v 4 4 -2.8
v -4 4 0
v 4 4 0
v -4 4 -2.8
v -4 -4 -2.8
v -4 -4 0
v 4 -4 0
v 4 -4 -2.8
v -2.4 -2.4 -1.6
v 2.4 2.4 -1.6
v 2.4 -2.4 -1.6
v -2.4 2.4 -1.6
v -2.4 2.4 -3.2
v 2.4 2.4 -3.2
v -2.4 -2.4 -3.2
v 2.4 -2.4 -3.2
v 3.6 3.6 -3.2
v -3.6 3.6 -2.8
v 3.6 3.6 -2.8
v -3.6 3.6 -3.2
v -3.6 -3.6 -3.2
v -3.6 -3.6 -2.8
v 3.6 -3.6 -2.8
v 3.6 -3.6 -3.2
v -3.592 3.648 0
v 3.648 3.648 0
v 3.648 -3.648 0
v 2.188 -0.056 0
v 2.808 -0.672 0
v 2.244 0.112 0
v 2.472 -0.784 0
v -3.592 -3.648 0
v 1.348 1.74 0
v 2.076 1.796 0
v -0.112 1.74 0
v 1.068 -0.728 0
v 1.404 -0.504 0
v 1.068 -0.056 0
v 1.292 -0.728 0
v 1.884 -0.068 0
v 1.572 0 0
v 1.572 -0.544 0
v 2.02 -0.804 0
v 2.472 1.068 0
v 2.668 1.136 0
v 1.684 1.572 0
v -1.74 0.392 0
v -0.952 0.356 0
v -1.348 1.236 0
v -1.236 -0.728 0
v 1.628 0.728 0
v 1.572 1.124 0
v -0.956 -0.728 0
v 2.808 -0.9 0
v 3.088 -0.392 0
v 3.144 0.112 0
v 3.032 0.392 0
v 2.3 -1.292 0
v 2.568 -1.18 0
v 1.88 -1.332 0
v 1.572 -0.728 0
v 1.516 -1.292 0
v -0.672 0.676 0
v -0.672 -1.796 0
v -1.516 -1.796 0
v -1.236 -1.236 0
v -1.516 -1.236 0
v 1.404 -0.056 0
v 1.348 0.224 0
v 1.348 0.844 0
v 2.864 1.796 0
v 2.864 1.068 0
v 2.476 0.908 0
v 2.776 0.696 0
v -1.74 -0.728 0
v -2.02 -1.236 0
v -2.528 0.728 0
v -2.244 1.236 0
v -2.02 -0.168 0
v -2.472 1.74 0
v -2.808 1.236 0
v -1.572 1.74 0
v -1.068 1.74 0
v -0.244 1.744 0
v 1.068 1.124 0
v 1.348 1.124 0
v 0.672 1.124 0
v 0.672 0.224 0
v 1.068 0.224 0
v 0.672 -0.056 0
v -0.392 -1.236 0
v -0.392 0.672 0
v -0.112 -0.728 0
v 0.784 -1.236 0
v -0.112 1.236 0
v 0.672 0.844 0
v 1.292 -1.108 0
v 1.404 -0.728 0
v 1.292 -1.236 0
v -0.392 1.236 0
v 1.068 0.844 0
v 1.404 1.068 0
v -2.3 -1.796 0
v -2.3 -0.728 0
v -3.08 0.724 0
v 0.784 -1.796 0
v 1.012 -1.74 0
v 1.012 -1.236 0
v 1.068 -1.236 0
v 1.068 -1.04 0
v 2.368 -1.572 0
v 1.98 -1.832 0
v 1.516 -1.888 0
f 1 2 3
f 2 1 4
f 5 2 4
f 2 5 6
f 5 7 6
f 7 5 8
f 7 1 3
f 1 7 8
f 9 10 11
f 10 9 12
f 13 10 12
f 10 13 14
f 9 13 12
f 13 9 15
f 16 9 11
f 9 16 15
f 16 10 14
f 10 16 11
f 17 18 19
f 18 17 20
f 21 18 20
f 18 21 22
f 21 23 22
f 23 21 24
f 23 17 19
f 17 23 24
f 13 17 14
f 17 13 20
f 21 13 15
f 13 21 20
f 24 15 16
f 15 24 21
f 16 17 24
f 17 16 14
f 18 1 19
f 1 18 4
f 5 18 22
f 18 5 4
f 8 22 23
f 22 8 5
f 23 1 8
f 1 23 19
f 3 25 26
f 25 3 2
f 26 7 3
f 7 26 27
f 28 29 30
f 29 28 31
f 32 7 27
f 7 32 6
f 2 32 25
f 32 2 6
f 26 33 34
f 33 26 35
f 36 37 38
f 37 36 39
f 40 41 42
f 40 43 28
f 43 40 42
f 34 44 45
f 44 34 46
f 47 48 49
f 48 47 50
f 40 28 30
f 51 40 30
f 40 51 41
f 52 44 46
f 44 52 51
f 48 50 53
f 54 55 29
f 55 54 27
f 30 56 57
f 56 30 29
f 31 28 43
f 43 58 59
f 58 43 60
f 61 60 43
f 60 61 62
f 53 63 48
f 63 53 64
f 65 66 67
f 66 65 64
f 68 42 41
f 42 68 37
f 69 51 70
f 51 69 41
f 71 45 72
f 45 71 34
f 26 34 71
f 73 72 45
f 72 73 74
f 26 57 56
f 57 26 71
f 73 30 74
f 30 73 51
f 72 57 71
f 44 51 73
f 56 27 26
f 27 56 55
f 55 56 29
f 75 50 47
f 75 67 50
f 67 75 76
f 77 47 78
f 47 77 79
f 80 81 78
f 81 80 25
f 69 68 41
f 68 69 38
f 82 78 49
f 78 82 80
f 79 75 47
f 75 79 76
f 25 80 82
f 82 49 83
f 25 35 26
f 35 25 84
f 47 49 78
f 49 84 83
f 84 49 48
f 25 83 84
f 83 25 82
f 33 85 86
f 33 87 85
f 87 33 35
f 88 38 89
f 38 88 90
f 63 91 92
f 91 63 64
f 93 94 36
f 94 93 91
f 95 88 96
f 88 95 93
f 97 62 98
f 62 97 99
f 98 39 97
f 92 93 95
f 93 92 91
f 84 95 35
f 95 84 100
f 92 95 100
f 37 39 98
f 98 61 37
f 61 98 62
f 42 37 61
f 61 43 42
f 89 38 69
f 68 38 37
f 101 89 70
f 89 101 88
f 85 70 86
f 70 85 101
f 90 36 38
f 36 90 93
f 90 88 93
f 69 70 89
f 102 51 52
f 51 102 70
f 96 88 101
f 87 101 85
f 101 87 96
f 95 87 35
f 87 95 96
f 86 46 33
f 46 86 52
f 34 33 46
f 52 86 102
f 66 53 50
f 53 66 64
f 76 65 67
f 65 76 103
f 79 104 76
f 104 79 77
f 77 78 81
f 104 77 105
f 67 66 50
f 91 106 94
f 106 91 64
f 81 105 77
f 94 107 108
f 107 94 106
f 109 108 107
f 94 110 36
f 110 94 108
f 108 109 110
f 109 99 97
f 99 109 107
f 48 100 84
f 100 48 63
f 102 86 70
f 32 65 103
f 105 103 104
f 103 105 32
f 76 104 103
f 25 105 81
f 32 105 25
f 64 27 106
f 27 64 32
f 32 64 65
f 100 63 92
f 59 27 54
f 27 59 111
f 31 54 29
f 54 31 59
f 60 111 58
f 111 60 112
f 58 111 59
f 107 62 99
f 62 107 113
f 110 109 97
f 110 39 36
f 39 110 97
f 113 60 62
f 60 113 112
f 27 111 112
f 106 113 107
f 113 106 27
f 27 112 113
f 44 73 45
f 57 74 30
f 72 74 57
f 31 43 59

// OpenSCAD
// file: ../p/box5.scad
use <../lib.scad>
function ldraw_lib__box5() = [
// 0 Box with 5 Faces and All Edges
// 0 Name: box5.dat
// 0 Author: James Jessiman
// 0 !LDRAW_ORG Primitive UPDATE 2012-01
// 0 !LICENSE Licensed under CC BY 4.0 : see CAreadme.txt
// 
// 0 BFC CERTIFY CCW
  [0,"BFC","CERTIFY"],
  [0,"BFC","CCW"],
// 
// 0 !HISTORY 2002-04-03 [sbliss] Modified for BFC compliance
// 0 !HISTORY 2002-04-25 [PTadmin] Official Update 2002-02
// 0 !HISTORY 2007-06-24 [PTadmin] Header formatted for Contributor Agreement
// 0 !HISTORY 2008-07-01 [PTadmin] Official Update 2008-01
// 0 !HISTORY 2012-02-16 [Philo] Changed to CCW
// 0 !HISTORY 2012-03-30 [PTadmin] Official Update 2012-01
// 
// 
// 2 24 1 1 1 -1 1 1
  [2,24,1,1,1,-1,1,1],
// 2 24 -1 1 1 -1 1 -1
  [2,24,-1,1,1,-1,1,-1],
// 2 24 -1 1 -1 1 1 -1
  [2,24,-1,1,-1,1,1,-1],
// 2 24 1 1 -1 1 1 1
  [2,24,1,1,-1,1,1,1],
// 2 24 1 0 1 -1 0 1
  [2,24,1,0,1,-1,0,1],
// 2 24 -1 0 1 -1 0 -1
  [2,24,-1,0,1,-1,0,-1],
// 2 24 -1 0 -1 1 0 -1
  [2,24,-1,0,-1,1,0,-1],
// 2 24 1 0 -1 1 0 1
  [2,24,1,0,-1,1,0,1],
// 2 24 1 0 1 1 1 1
  [2,24,1,0,1,1,1,1],
// 2 24 -1 0 1 -1 1 1
  [2,24,-1,0,1,-1,1,1],
// 2 24 1 0 -1 1 1 -1
  [2,24,1,0,-1,1,1,-1],
// 2 24 -1 0 -1 -1 1 -1
  [2,24,-1,0,-1,-1,1,-1],
// 4 16 -1 1 1 1 1 1 1 1 -1 -1 1 -1
  [4,16,-1,1,1,1,1,1,1,1,-1,-1,1,-1],
// 4 16 -1 1 1 -1 0 1 1 0 1 1 1 1
  [4,16,-1,1,1,-1,0,1,1,0,1,1,1,1],
// 4 16 -1 1 -1 -1 0 -1 -1 0 1 -1 1 1
  [4,16,-1,1,-1,-1,0,-1,-1,0,1,-1,1,1],
// 4 16 1 1 -1 1 0 -1 -1 0 -1 -1 1 -1
  [4,16,1,1,-1,1,0,-1,-1,0,-1,-1,1,-1],
// 4 16 1 1 1 1 0 1 1 0 -1 1 1 -1
  [4,16,1,1,1,1,0,1,1,0,-1,1,1,-1],
];
module ldraw_lib__box5(step=0, col=false, unit=2/5, alt=false, line=0.2, solid=!$preview)
    makepoly(ldraw_lib__box5(), step=step, col=col, unit=unit, alt=alt, line=line, solid=solid);
ldraw_lib__box5(line=0.2);
// file: ../p/box4.scad
use <../lib.scad>
function ldraw_lib__box4() = [
// 0 Box with 4 Faces (2 Parallel Pairs) and All Edges
// 0 Name: box4.dat
// 0 Author: James Jessiman
// 0 !LDRAW_ORG Primitive UPDATE 2012-01
// 0 !LICENSE Licensed under CC BY 4.0 : see CAreadme.txt
// 
// 0 BFC CERTIFY CCW
  [0,"BFC","CERTIFY"],
  [0,"BFC","CCW"],
// 
// 0 !HISTORY 2002-04-03 [sbliss] Modified for BFC compliance
// 0 !HISTORY 2002-04-25 [PTadmin] Official Update 2002-02
// 0 !HISTORY 2007-06-24 [PTadmin] Header formatted for Contributor Agreement
// 0 !HISTORY 2008-07-01 [PTadmin] Official Update 2008-01
// 0 !HISTORY 2012-02-16 [Philo] Changed to CCW
// 0 !HISTORY 2012-03-30 [PTadmin] Official Update 2012-01
// 
// 
// 2 24 1 1 1 -1 1 1
  [2,24,1,1,1,-1,1,1],
// 2 24 -1 1 1 -1 1 -1
  [2,24,-1,1,1,-1,1,-1],
// 2 24 -1 1 -1 1 1 -1
  [2,24,-1,1,-1,1,1,-1],
// 2 24 1 1 -1 1 1 1
  [2,24,1,1,-1,1,1,1],
// 2 24 1 0 1 -1 0 1
  [2,24,1,0,1,-1,0,1],
// 2 24 -1 0 1 -1 0 -1
  [2,24,-1,0,1,-1,0,-1],
// 2 24 -1 0 -1 1 0 -1
  [2,24,-1,0,-1,1,0,-1],
// 2 24 1 0 -1 1 0 1
  [2,24,1,0,-1,1,0,1],
// 2 24 1 0 1 1 1 1
  [2,24,1,0,1,1,1,1],
// 2 24 -1 0 1 -1 1 1
  [2,24,-1,0,1,-1,1,1],
// 2 24 1 0 -1 1 1 -1
  [2,24,1,0,-1,1,1,-1],
// 2 24 -1 0 -1 -1 1 -1
  [2,24,-1,0,-1,-1,1,-1],
// 4 16 -1 1 1 -1 0 1 1 0 1 1 1 1
  [4,16,-1,1,1,-1,0,1,1,0,1,1,1,1],
// 4 16 -1 1 -1 -1 0 -1 -1 0 1 -1 1 1
  [4,16,-1,1,-1,-1,0,-1,-1,0,1,-1,1,1],
// 4 16 1 1 -1 1 0 -1 -1 0 -1 -1 1 -1
  [4,16,1,1,-1,1,0,-1,-1,0,-1,-1,1,-1],
// 4 16 1 1 1 1 0 1 1 0 -1 1 1 -1
  [4,16,1,1,1,1,0,1,1,0,-1,1,1,-1],
];
module ldraw_lib__box4(step=0, col=false, unit=2/5, alt=false, line=0.2, solid=!$preview)
    makepoly(ldraw_lib__box4(), step=step, col=col, unit=unit, alt=alt, line=line, solid=solid);
ldraw_lib__box4(line=0.2);
// file: s/3070bs01.scad
use <../../lib.scad>
use <../../p/box4.scad>
use <../../p/box5.scad>
function ldraw_lib__s__3070bs01() = [
// 0 ~Tile  1 x  1 with Groove without Top Face
// 0 Name: s\3070bs01.dat
// 0 Author: Chris Dee [cwdee]
// 0 !LDRAW_ORG Subpart UPDATE 2009-02
// 0 !LICENSE Licensed under CC BY 4.0 : see CAreadme.txt
// 
// 0 BFC CERTIFY CCW
  [0,"BFC","CERTIFY"],
  [0,"BFC","CCW"],
// 
// 0 !HISTORY 2009-09-03 [PTadmin] Official Update 2009-02
// 
// 
// 1 16 0 0 0 10 0 0 0 7 0 0 0 10 box4.dat
  [1,16,0,0,0,10,0,0,0,7,0,0,0,10, ldraw_lib__box4()],
// 0 BFC INVERTNEXT
  [0,"BFC","INVERTNEXT"],
// 1 16 0 8 0 6 0 0 0 -4 0 0 0 6 box5.dat
  [1,16,0,8,0,6,0,0,0,-4,0,0,0,6, ldraw_lib__box5()],
// 1 16 0 7 0 9 0 0 0 1 0 0 0 9 box4.dat
  [1,16,0,7,0,9,0,0,0,1,0,0,0,9, ldraw_lib__box4()],
// 
// 4 16 9 8 9 6 8 6 -6 8 6 -9 8 9
  [4,16,9,8,9,6,8,6,-6,8,6,-9,8,9],
// 4 16 -9 8 9 -6 8 6 -6 8 -6 -9 8 -9
  [4,16,-9,8,9,-6,8,6,-6,8,-6,-9,8,-9],
// 4 16 -9 8 -9 -6 8 -6 6 8 -6 9 8 -9
  [4,16,-9,8,-9,-6,8,-6,6,8,-6,9,8,-9],
// 4 16 9 8 -9 6 8 -6 6 8 6 9 8 9
  [4,16,9,8,-9,6,8,-6,6,8,6,9,8,9],
// 
// 4 16 10 7 10 9 7 9 -9 7 9 -10 7 10
  [4,16,10,7,10,9,7,9,-9,7,9,-10,7,10],
// 4 16 -10 7 10 -9 7 9 -9 7 -9 -10 7 -10
  [4,16,-10,7,10,-9,7,9,-9,7,-9,-10,7,-10],
// 4 16 -10 7 -10 -9 7 -9 9 7 -9 10 7 -10
  [4,16,-10,7,-10,-9,7,-9,9,7,-9,10,7,-10],
// 4 16 10 7 -10 9 7 -9 9 7 9 10 7 10
  [4,16,10,7,-10,9,7,-9,9,7,9,10,7,10],
// 0
];
module ldraw_lib__s__3070bs01(step=0, col=false, unit=2/5, alt=false, line=0.2, solid=!$preview)
    makepoly(ldraw_lib__s__3070bs01(), step=step, col=col, unit=unit, alt=alt, line=line, solid=solid);
ldraw_lib__s__3070bs01(line=0.2);
// main file
use <../lib.scad>
use <s/3070bs01.scad>
function ldraw_lib__3070bp0q() = [
// 0 Tile  1 x  1 with Blue, Green, and Yellow Layered "YES" on Bright Pink Background Pattern
// 0 Name: 3070bp0q.dat
// 0 Author: Philippe Hurbain [Philo]
// 0 !LDRAW_ORG Part UPDATE 2020-03
// 0 !LICENSE Licensed under CC BY 4.0 : see CAreadme.txt
// 
// 0 BFC CERTIFY CCW
  [0,"BFC","CERTIFY"],
  [0,"BFC","CCW"],
// 
// 0 !KEYWORDS BrickLink 3070pb150, Dots, Rebrickable 3070bpr0017, Set 41916
// 
// 0 !HISTORY 2020-12-29 [PTadmin] Official Update 2020-03
// 
// 
// 1 16 0 0 0 1 0 0 0 1 0 0 0 1 s\3070bs01.dat
  [1,16,0,0,0,1,0,0,0,1,0,0,0,1, ldraw_lib__s__3070bs01()],
// 4 16 10 0 10 -10 0 10 -8.98 0 9.12 9.12 0 9.12
  [4,16,10,0,10,-10,0,10,-8.98,0,9.12,9.12,0,9.12],
// 4 16 10 0 -10 10 0 10 9.12 0 9.12 9.12 0 -9.12
  [4,16,10,0,-10,10,0,10,9.12,0,9.12,9.12,0,-9.12],
// 4 1 7.02 0 -1.68 5.61 0 0.28 5.47 0 -0.14 6.18 0 -1.96
  [4,1,7.02,0,-1.68,5.61,0,0.28,5.47,0,-0.14,6.18,0,-1.96],
// 4 16 -8.98 0 -9.12 -10 0 -10 10 0 -10 9.12 0 -9.12
  [4,16,-8.98,0,-9.12,-10,0,-10,10,0,-10,9.12,0,-9.12],
// 4 16 -10 0 10 -10 0 -10 -8.98 0 -9.12 -8.98 0 9.12
  [4,16,-10,0,10,-10,0,-10,-8.98,0,-9.12,-8.98,0,9.12],
// 4 29 3.37 0 4.35 5.19 0 4.49 9.12 0 9.12 -0.28 0 4.35
  [4,29,3.37,0,4.35,5.19,0,4.49,9.12,0,9.12,-0.28,0,4.35],
// 4 1 2.67 0 -1.82 3.23 0 -1.82 3.51 0 -1.26 2.67 0 -0.14
  [4,1,2.67,0,-1.82,3.23,0,-1.82,3.51,0,-1.26,2.67,0,-0.14],
// 3 1 4.71 0 -0.17 3.93 0 0 3.93 0 -1.36
  [3,1,4.71,0,-0.17,3.93,0,0,3.93,0,-1.36],
// 4 1 5.05 0 -2.01 5.47 0 -0.14 4.71 0 -0.17 3.93 0 -1.36
  [4,1,5.05,0,-2.01,5.47,0,-0.14,4.71,0,-0.17,3.93,0,-1.36],
// 4 1 6.18 0 2.67 6.67 0 2.84 5.19 0 4.49 4.21 0 3.93
  [4,1,6.18,0,2.67,6.67,0,2.84,5.19,0,4.49,4.21,0,3.93],
// 4 1 -4.35 0 0.98 -3.09 0 -1.82 -2.38 0 0.89 -3.37 0 3.09
  [4,1,-4.35,0,0.98,-3.09,0,-1.82,-2.38,0,0.89,-3.37,0,3.09],
// 3 3 4.71 0 -0.17 5.47 0 -0.14 5.61 0 0.28
  [3,3,4.71,0,-0.17,5.47,0,-0.14,5.61,0,0.28],
// 4 3 4.07 0 1.82 3.93 0 0 4.71 0 -0.17 5.61 0 0.28
  [4,3,4.07,0,1.82,3.93,0,0,4.71,0,-0.17,5.61,0,0.28],
// 4 1 6.18 0 2.67 4.21 0 3.93 3.93 0 2.81 4.07 0 1.82
  [4,1,6.18,0,2.67,4.21,0,3.93,3.93,0,2.81,4.07,0,1.82],
// 3 1 -2.38 0 0.89 -3.09 0 -1.82 -2.39 0 -1.82
  [3,1,-2.38,0,0.89,-3.09,0,-1.82,-2.39,0,-1.82],
// 4 29 7.72 0 -0.98 7.02 0 -1.68 7.02 0 -2.25 9.12 0 -9.12
  [4,29,7.72,0,-0.98,7.02,0,-1.68,7.02,0,-2.25,9.12,0,-9.12],
// 4 1 7.58 0 0.98 5.61 0 0.28 7.02 0 -1.68 7.86 0 0.28
  [4,1,7.58,0,0.98,5.61,0,0.28,7.02,0,-1.68,7.86,0,0.28],
// 3 1 6.18 0 -1.96 5.47 0 -0.14 5.05 0 -2.01
  [3,1,6.18,0,-1.96,5.47,0,-0.14,5.05,0,-2.01],
// 4 3 6.42 0 -2.95 5.05 0 -2.01 4.7 0 -3.33 5.75 0 -3.23
  [4,3,6.42,0,-2.95,5.05,0,-2.01,4.7,0,-3.33,5.75,0,-3.23],
// 4 3 3.93 0 -1.82 3.79 0 -3.23 4.7 0 -3.33 5.05 0 -2.01
  [4,3,3.93,0,-1.82,3.79,0,-3.23,4.7,0,-3.33,5.05,0,-2.01],
// 4 29 -2.39 0 -1.82 -1.68 0 -4.49 -1.68 0 1.69 -2.38 0 0.89
  [4,29,-2.39,0,-1.82,-1.68,0,-4.49,-1.68,0,1.69,-2.38,0,0.89],
// 4 29 -3.09 0 -3.09 -3.79 0 -3.09 -3.79 0 -4.49 -1.68 0 -4.49
  [4,29,-3.09,0,-3.09,-3.79,0,-3.09,-3.79,0,-4.49,-1.68,0,-4.49],
// 4 14 3.51 0 -0.14 3.51 0 -1.26 3.93 0 -1.36 3.93 0 0
  [4,14,3.51,0,-0.14,3.51,0,-1.26,3.93,0,-1.36,3.93,0,0],
// 4 3 4.07 0 1.82 3.37 0 2.11 3.37 0 0.56 3.93 0 0
  [4,3,4.07,0,1.82,3.37,0,2.11,3.37,0,0.56,3.93,0,0],
// 4 1 7.16 0 4.49 5.19 0 4.49 6.67 0 2.84 7.16 0 2.67
  [4,1,7.16,0,4.49,5.19,0,4.49,6.67,0,2.84,7.16,0,2.67],
// 3 29 9.12 0 9.12 5.19 0 4.49 7.16 0 4.49
  [3,29,9.12,0,9.12,5.19,0,4.49,7.16,0,4.49],
// 4 29 6.19 0 2.27 6.94 0 1.74 7.16 0 2.67 6.67 0 2.84
  [4,29,6.19,0,2.27,6.94,0,1.74,7.16,0,2.67,6.67,0,2.84],
// 4 29 7.86 0 0.28 9.12 0 9.12 7.16 0 4.49 7.58 0 0.98
  [4,29,7.86,0,0.28,9.12,0,9.12,7.16,0,4.49,7.58,0,0.98],
// 4 1 5.61 0 0.28 6.94 0 1.74 6.19 0 2.27 4.07 0 1.82
  [4,1,5.61,0,0.28,6.94,0,1.74,6.19,0,2.27,4.07,0,1.82],
// 3 29 7.16 0 2.67 7.58 0 0.98 7.16 0 4.49
  [3,29,7.16,0,2.67,7.58,0,0.98,7.16,0,4.49],
// 3 1 6.18 0 2.67 4.07 0 1.82 6.19 0 2.27
  [3,1,6.18,0,2.67,4.07,0,1.82,6.19,0,2.27],
// 4 29 7.86 0 0.28 7.72 0 -0.98 9.12 0 -9.12 9.12 0 9.12
  [4,29,7.86,0,0.28,7.72,0,-0.98,9.12,0,-9.12,9.12,0,9.12],
// 3 1 7.72 0 -0.98 7.86 0 0.28 7.02 0 -1.68
  [3,1,7.72,0,-0.98,7.86,0,0.28,7.02,0,-1.68],
// 3 1 -4.35 0 -1.82 -3.09 0 -1.82 -4.35 0 0.98
  [3,1,-4.35,0,-1.82,-3.09,0,-1.82,-4.35,0,0.98],
// 4 3 -3.79 0 -3.09 -3.09 0 -1.82 -4.35 0 -1.82 -5.05 0 -3.09
  [4,3,-3.79,0,-3.09,-3.09,0,-1.82,-4.35,0,-1.82,-5.05,0,-3.09],
// 4 3 -6.32 0 1.82 -5.05 0 -0.42 -4.35 0 0.98 -5.61 0 3.09
  [4,3,-6.32,0,1.82,-5.05,0,-0.42,-4.35,0,0.98,-5.61,0,3.09],
// 4 29 -7.02 0 3.09 -5.61 0 3.09 -6.18 0 4.35 -8.98 0 9.12
  [4,29,-7.02,0,3.09,-5.61,0,3.09,-6.18,0,4.35,-8.98,0,9.12],
// 4 14 3.51 0 -0.14 3.93 0 0 3.37 0 0.56 2.67 0 -0.14
  [4,14,3.51,0,-0.14,3.93,0,0,3.37,0,0.56,2.67,0,-0.14],
// 4 1 -5.61 0 3.09 -3.37 0 3.09 -3.93 0 4.35 -6.18 0 4.35
  [4,1,-5.61,0,3.09,-3.37,0,3.09,-3.93,0,4.35,-6.18,0,4.35],
// 4 3 -4.35 0 -1.82 -4.35 0 0.98 -5.05 0 -0.42 -5.05 0 -3.09
  [4,3,-4.35,0,-1.82,-4.35,0,0.98,-5.05,0,-0.42,-5.05,0,-3.09],
// 3 29 -8.98 0 9.12 -6.18 0 4.35 -3.93 0 4.35
  [3,29,-8.98,0,9.12,-6.18,0,4.35,-3.93,0,4.35],
// 3 29 -3.93 0 4.35 -3.37 0 3.09 -2.67 0 4.35
  [3,29,-3.93,0,4.35,-3.37,0,3.09,-2.67,0,4.35],
// 4 29 -0.28 0 4.35 9.12 0 9.12 -8.98 0 9.12 -0.61 0 4.36
  [4,29,-0.28,0,4.35,9.12,0,9.12,-8.98,0,9.12,-0.61,0,4.36],
// 3 1 -4.35 0 0.98 -3.37 0 3.09 -5.61 0 3.09
  [3,1,-4.35,0,0.98,-3.37,0,3.09,-5.61,0,3.09],
// 4 1 -0.61 0 4.36 -2.67 0 4.35 -3.37 0 3.09 -2.38 0 0.89
  [4,1,-0.61,0,4.36,-2.67,0,4.35,-3.37,0,3.09,-2.38,0,0.89],
// 4 29 -2.67 0 4.35 -0.61 0 4.36 -8.98 0 9.12 -3.93 0 4.35
  [4,29,-2.67,0,4.35,-0.61,0,4.36,-8.98,0,9.12,-3.93,0,4.35],
// 3 1 3.37 0 4.35 2.67 0 2.81 3.37 0 2.81
  [3,1,3.37,0,4.35,2.67,0,2.81,3.37,0,2.81],
// 4 1 3.37 0 4.35 -0.28 0 4.35 1.68 0 2.81 2.67 0 2.81
  [4,1,3.37,0,4.35,-0.28,0,4.35,1.68,0,2.81,2.67,0,2.81],
// 4 3 2.67 0 -0.14 2.67 0 0.56 1.68 0 0.56 1.68 0 -0.14
  [4,3,2.67,0,-0.14,2.67,0,0.56,1.68,0,0.56,1.68,0,-0.14],
// 4 14 -1.68 0 -4.49 -0.98 0 -3.09 -0.98 0 1.68 -1.68 0 1.69
  [4,14,-1.68,0,-4.49,-0.98,0,-3.09,-0.98,0,1.68,-1.68,0,1.69],
// 4 3 1.96 0 -3.09 2.67 0 -1.82 -0.28 0 -1.82 -0.98 0 -3.09
  [4,3,1.96,0,-3.09,2.67,0,-1.82,-0.28,0,-1.82,-0.98,0,-3.09],
// 4 1 -0.28 0 3.09 -0.28 0 -1.82 1.68 0 0.56 1.68 0 2.11
  [4,1,-0.28,0,3.09,-0.28,0,-1.82,1.68,0,0.56,1.68,0,2.11],
// 4 3 3.79 0 -3.23 3.51 0 -1.82 3.23 0 -2.77 3.23 0 -3.09
  [4,3,3.79,0,-3.23,3.51,0,-1.82,3.23,0,-2.77,3.23,0,-3.09],
// 3 3 3.51 0 -1.82 3.23 0 -1.82 3.23 0 -2.77
  [3,3,3.51,0,-1.82,3.23,0,-1.82,3.23,0,-2.77],
// 4 3 -0.98 0 1.68 -0.98 0 -3.09 -0.28 0 -1.82 -0.28 0 3.09
  [4,3,-0.98,0,1.68,-0.98,0,-3.09,-0.28,0,-1.82,-0.28,0,3.09],
// 4 29 -0.28 0 3.09 -0.28 0 4.35 -0.61 0 4.36 -0.98 0 3.09
  [4,29,-0.28,0,3.09,-0.28,0,4.35,-0.61,0,4.36,-0.98,0,3.09],
// 3 3 -0.98 0 1.68 -0.28 0 3.09 -0.98 0 3.09
  [3,3,-0.98,0,1.68,-0.28,0,3.09,-0.98,0,3.09],
// 3 1 3.51 0 -1.26 3.23 0 -1.82 3.51 0 -1.82
  [3,1,3.51,0,-1.26,3.23,0,-1.82,3.51,0,-1.82],
// 4 3 3.51 0 -1.82 3.79 0 -3.23 3.93 0 -1.82 3.51 0 -1.26
  [4,3,3.51,0,-1.82,3.79,0,-3.23,3.93,0,-1.82,3.51,0,-1.26],
// 3 3 3.93 0 -1.36 3.51 0 -1.26 3.93 0 -1.82
  [3,3,3.93,0,-1.36,3.51,0,-1.26,3.93,0,-1.82],
// 3 1 3.93 0 -1.82 5.05 0 -2.01 3.93 0 -1.36
  [3,1,3.93,0,-1.82,5.05,0,-2.01,3.93,0,-1.36],
// 3 14 2.67 0 0.56 2.67 0 -0.14 3.37 0 0.56
  [3,14,2.67,0,0.56,2.67,0,-0.14,3.37,0,0.56],
// 3 1 3.51 0 -0.14 2.67 0 -0.14 3.51 0 -1.26
  [3,1,3.51,0,-0.14,2.67,0,-0.14,3.51,0,-1.26],
// 4 1 2.67 0 2.11 1.68 0 0.56 2.67 0 0.56 3.37 0 2.11
  [4,1,2.67,0,2.11,1.68,0,0.56,2.67,0,0.56,3.37,0,2.11],
// 4 29 2.67 0 2.81 2.67 0 2.11 3.37 0 2.11 3.37 0 2.81
  [4,29,2.67,0,2.81,2.67,0,2.11,3.37,0,2.11,3.37,0,2.81],
// 4 1 2.67 0 -1.82 2.67 0 -0.14 1.68 0 -0.14 -0.28 0 -1.82
  [4,1,2.67,0,-1.82,2.67,0,-0.14,1.68,0,-0.14,-0.28,0,-1.82],
// 3 1 1.68 0 -0.14 1.68 0 0.56 -0.28 0 -1.82
  [3,1,1.68,0,-0.14,1.68,0,0.56,-0.28,0,-1.82],
// 3 1 3.37 0 0.56 3.37 0 2.11 2.67 0 0.56
  [3,1,3.37,0,0.56,3.37,0,2.11,2.67,0,0.56],
// 4 3 3.51 0 2.67 3.37 0 2.11 4.07 0 1.82 3.93 0 2.81
  [4,3,3.51,0,2.67,3.37,0,2.11,4.07,0,1.82,3.93,0,2.81],
// 3 1 1.68 0 2.11 1.68 0 0.56 2.67 0 2.11
  [3,1,1.68,0,2.11,1.68,0,0.56,2.67,0,2.11],
// 4 3 2.67 0 2.11 2.67 0 2.81 1.68 0 2.81 1.68 0 2.11
  [4,3,2.67,0,2.11,2.67,0,2.81,1.68,0,2.81,1.68,0,2.11],
// 4 1 1.68 0 2.81 -0.28 0 4.35 -0.28 0 3.09 1.68 0 2.11
  [4,1,1.68,0,2.81,-0.28,0,4.35,-0.28,0,3.09,1.68,0,2.11],
// 4 29 3.93 0 2.81 4.21 0 3.93 3.37 0 4.35 3.37 0 2.81
  [4,29,3.93,0,2.81,4.21,0,3.93,3.37,0,4.35,3.37,0,2.81],
// 3 29 5.19 0 4.49 3.37 0 4.35 4.21 0 3.93
  [3,29,5.19,0,4.49,3.37,0,4.35,4.21,0,3.93],
// 3 29 3.93 0 2.81 3.37 0 2.81 3.51 0 2.67
  [3,29,3.93,0,2.81,3.37,0,2.81,3.51,0,2.67],
// 4 29 -2.39 0 -1.82 -3.09 0 -1.82 -3.09 0 -3.09 -1.68 0 -4.49
  [4,29,-2.39,0,-1.82,-3.09,0,-1.82,-3.09,0,-3.09,-1.68,0,-4.49],
// 4 14 -5.75 0 -4.49 -3.79 0 -4.49 -3.79 0 -3.09 -5.05 0 -3.09
  [4,14,-5.75,0,-4.49,-3.79,0,-4.49,-3.79,0,-3.09,-5.05,0,-3.09],
// 4 14 -5.75 0 -1.82 -5.05 0 -3.09 -5.05 0 -0.42 -6.32 0 1.82
  [4,14,-5.75,0,-1.82,-5.05,0,-3.09,-5.05,0,-0.42,-6.32,0,1.82],
// 3 3 -6.32 0 1.82 -5.61 0 3.09 -7.02 0 3.09
  [3,3,-6.32,0,1.82,-5.61,0,3.09,-7.02,0,3.09],
// 3 14 -5.75 0 -1.82 -6.32 0 1.82 -7.7 0 1.81
  [3,14,-5.75,0,-1.82,-6.32,0,1.82,-7.7,0,1.81],
// 3 3 -3.79 0 -3.09 -3.09 0 -3.09 -3.09 0 -1.82
  [3,3,-3.79,0,-3.09,-3.09,0,-3.09,-3.09,0,-1.82],
// 4 14 -1.68 0 -4.49 1.96 0 -4.49 1.96 0 -3.09 -0.98 0 -3.09
  [4,14,-1.68,0,-4.49,1.96,0,-4.49,1.96,0,-3.09,-0.98,0,-3.09],
// 3 29 -7.02 0 3.09 -7.7 0 1.81 -6.32 0 1.82
  [3,29,-7.02,0,3.09,-7.7,0,1.81,-6.32,0,1.82],
// 4 29 2.53 0 -3.09 1.96 0 -3.09 1.96 0 -4.49 2.53 0 -4.35
  [4,29,2.53,0,-3.09,1.96,0,-3.09,1.96,0,-4.49,2.53,0,-4.35],
// 3 14 2.67 0 -3.09 2.53 0 -3.09 2.53 0 -4.35
  [3,14,2.67,0,-3.09,2.53,0,-3.09,2.53,0,-4.35],
// 4 3 1.96 0 -3.09 2.53 0 -3.09 2.67 0 -2.6 2.67 0 -1.82
  [4,3,1.96,0,-3.09,2.53,0,-3.09,2.67,0,-2.6,2.67,0,-1.82],
// 3 3 2.53 0 -3.09 2.67 0 -3.09 2.67 0 -2.6
  [3,3,2.53,0,-3.09,2.67,0,-3.09,2.67,0,-2.6],
// 4 14 2.67 0 -3.09 2.53 0 -4.35 3.23 0 -3.09 3.23 0 -2.77
  [4,14,2.67,0,-3.09,2.53,0,-4.35,3.23,0,-3.09,3.23,0,-2.77],
// 4 29 -0.98 0 3.09 -0.61 0 4.36 -2.38 0 0.89 -1.68 0 1.69
  [4,29,-0.98,0,3.09,-0.61,0,4.36,-2.38,0,0.89,-1.68,0,1.69],
// 3 29 3.51 0 2.67 3.37 0 2.81 3.37 0 2.11
  [3,29,3.51,0,2.67,3.37,0,2.81,3.37,0,2.11],
// 3 29 -8.98 0 -9.12 -3.79 0 -4.49 -5.75 0 -4.49
  [3,29,-8.98,0,-9.12,-3.79,0,-4.49,-5.75,0,-4.49],
// 4 29 -5.75 0 -4.49 -5.75 0 -1.82 -7.7 0 1.81 -8.98 0 -9.12
  [4,29,-5.75,0,-4.49,-5.75,0,-1.82,-7.7,0,1.81,-8.98,0,-9.12],
// 3 14 -5.05 0 -3.09 -5.75 0 -1.82 -5.75 0 -4.49
  [3,14,-5.05,0,-3.09,-5.75,0,-1.82,-5.75,0,-4.49],
// 3 29 -8.98 0 9.12 -7.7 0 1.81 -7.02 0 3.09
  [3,29,-8.98,0,9.12,-7.7,0,1.81,-7.02,0,3.09],
// 3 29 -8.98 0 -9.12 -7.7 0 1.81 -8.98 0 9.12
  [3,29,-8.98,0,-9.12,-7.7,0,1.81,-8.98,0,9.12],
// 4 29 1.96 0 -4.49 -1.68 0 -4.49 -8.98 0 -9.12 9.12 0 -9.12
  [4,29,1.96,0,-4.49,-1.68,0,-4.49,-8.98,0,-9.12,9.12,0,-9.12],
// 3 29 -8.98 0 -9.12 -1.68 0 -4.49 -3.79 0 -4.49
  [3,29,-8.98,0,-9.12,-1.68,0,-4.49,-3.79,0,-4.49],
// 3 29 -0.98 0 3.09 -1.68 0 1.69 -0.98 0 1.68
  [3,29,-0.98,0,3.09,-1.68,0,1.69,-0.98,0,1.68],
// 4 29 6.42 0 -2.95 5.92 0 -3.93 9.12 0 -9.12 7.02 0 -2.25
  [4,29,6.42,0,-2.95,5.92,0,-3.93,9.12,0,-9.12,7.02,0,-2.25],
// 4 3 7.02 0 -2.25 7.02 0 -1.68 6.18 0 -1.96 6.42 0 -2.95
  [4,3,7.02,0,-2.25,7.02,0,-1.68,6.18,0,-1.96,6.42,0,-2.95],
// 4 14 4.7 0 -3.33 4.95 0 -4.58 5.92 0 -3.93 5.75 0 -3.23
  [4,14,4.7,0,-3.33,4.95,0,-4.58,5.92,0,-3.93,5.75,0,-3.23],
// 3 14 5.75 0 -3.23 5.92 0 -3.93 6.42 0 -2.95
  [3,14,5.75,0,-3.23,5.92,0,-3.93,6.42,0,-2.95],
// 4 14 3.79 0 -3.23 3.23 0 -3.09 2.53 0 -4.35 3.79 0 -4.72
  [4,14,3.79,0,-3.23,3.23,0,-3.09,2.53,0,-4.35,3.79,0,-4.72],
// 3 14 2.67 0 -2.6 2.67 0 -3.09 3.23 0 -2.77
  [3,14,2.67,0,-2.6,2.67,0,-3.09,3.23,0,-2.77],
// 4 29 3.23 0 -1.82 2.67 0 -1.82 2.67 0 -2.6 3.23 0 -2.77
  [4,29,3.23,0,-1.82,2.67,0,-1.82,2.67,0,-2.6,3.23,0,-2.77],
// 4 14 3.79 0 -4.72 4.95 0 -4.58 4.7 0 -3.33 3.79 0 -3.23
  [4,14,3.79,0,-4.72,4.95,0,-4.58,4.7,0,-3.33,3.79,0,-3.23],
// 3 29 9.12 0 -9.12 5.92 0 -3.93 4.95 0 -4.58
  [3,29,9.12,0,-9.12,5.92,0,-3.93,4.95,0,-4.58],
// 4 29 3.79 0 -4.72 2.53 0 -4.35 1.96 0 -4.49 9.12 0 -9.12
  [4,29,3.79,0,-4.72,2.53,0,-4.35,1.96,0,-4.49,9.12,0,-9.12],
// 3 29 9.12 0 -9.12 4.95 0 -4.58 3.79 0 -4.72
  [3,29,9.12,0,-9.12,4.95,0,-4.58,3.79,0,-4.72],
// 3 29 6.18 0 2.67 6.19 0 2.27 6.67 0 2.84
  [3,29,6.18,0,2.67,6.19,0,2.27,6.67,0,2.84],
// 3 1 7.58 0 0.98 6.94 0 1.74 5.61 0 0.28
  [3,1,7.58,0,0.98,6.94,0,1.74,5.61,0,0.28],
// 3 29 7.16 0 2.67 6.94 0 1.74 7.58 0 0.98
  [3,29,7.16,0,2.67,6.94,0,1.74,7.58,0,0.98],
// 3 3 6.18 0 -1.96 5.05 0 -2.01 6.42 0 -2.95
  [3,3,6.18,0,-1.96,5.05,0,-2.01,6.42,0,-2.95],
];
module ldraw_lib__3070bp0q(step=0, col=false, unit=2/5, alt=false, line=0.2, solid=!$preview)
    makepoly(ldraw_lib__3070bp0q(), step=step, col=col, unit=unit, alt=alt, line=line, solid=solid);
ldraw_lib__3070bp0q(line=0.2);
